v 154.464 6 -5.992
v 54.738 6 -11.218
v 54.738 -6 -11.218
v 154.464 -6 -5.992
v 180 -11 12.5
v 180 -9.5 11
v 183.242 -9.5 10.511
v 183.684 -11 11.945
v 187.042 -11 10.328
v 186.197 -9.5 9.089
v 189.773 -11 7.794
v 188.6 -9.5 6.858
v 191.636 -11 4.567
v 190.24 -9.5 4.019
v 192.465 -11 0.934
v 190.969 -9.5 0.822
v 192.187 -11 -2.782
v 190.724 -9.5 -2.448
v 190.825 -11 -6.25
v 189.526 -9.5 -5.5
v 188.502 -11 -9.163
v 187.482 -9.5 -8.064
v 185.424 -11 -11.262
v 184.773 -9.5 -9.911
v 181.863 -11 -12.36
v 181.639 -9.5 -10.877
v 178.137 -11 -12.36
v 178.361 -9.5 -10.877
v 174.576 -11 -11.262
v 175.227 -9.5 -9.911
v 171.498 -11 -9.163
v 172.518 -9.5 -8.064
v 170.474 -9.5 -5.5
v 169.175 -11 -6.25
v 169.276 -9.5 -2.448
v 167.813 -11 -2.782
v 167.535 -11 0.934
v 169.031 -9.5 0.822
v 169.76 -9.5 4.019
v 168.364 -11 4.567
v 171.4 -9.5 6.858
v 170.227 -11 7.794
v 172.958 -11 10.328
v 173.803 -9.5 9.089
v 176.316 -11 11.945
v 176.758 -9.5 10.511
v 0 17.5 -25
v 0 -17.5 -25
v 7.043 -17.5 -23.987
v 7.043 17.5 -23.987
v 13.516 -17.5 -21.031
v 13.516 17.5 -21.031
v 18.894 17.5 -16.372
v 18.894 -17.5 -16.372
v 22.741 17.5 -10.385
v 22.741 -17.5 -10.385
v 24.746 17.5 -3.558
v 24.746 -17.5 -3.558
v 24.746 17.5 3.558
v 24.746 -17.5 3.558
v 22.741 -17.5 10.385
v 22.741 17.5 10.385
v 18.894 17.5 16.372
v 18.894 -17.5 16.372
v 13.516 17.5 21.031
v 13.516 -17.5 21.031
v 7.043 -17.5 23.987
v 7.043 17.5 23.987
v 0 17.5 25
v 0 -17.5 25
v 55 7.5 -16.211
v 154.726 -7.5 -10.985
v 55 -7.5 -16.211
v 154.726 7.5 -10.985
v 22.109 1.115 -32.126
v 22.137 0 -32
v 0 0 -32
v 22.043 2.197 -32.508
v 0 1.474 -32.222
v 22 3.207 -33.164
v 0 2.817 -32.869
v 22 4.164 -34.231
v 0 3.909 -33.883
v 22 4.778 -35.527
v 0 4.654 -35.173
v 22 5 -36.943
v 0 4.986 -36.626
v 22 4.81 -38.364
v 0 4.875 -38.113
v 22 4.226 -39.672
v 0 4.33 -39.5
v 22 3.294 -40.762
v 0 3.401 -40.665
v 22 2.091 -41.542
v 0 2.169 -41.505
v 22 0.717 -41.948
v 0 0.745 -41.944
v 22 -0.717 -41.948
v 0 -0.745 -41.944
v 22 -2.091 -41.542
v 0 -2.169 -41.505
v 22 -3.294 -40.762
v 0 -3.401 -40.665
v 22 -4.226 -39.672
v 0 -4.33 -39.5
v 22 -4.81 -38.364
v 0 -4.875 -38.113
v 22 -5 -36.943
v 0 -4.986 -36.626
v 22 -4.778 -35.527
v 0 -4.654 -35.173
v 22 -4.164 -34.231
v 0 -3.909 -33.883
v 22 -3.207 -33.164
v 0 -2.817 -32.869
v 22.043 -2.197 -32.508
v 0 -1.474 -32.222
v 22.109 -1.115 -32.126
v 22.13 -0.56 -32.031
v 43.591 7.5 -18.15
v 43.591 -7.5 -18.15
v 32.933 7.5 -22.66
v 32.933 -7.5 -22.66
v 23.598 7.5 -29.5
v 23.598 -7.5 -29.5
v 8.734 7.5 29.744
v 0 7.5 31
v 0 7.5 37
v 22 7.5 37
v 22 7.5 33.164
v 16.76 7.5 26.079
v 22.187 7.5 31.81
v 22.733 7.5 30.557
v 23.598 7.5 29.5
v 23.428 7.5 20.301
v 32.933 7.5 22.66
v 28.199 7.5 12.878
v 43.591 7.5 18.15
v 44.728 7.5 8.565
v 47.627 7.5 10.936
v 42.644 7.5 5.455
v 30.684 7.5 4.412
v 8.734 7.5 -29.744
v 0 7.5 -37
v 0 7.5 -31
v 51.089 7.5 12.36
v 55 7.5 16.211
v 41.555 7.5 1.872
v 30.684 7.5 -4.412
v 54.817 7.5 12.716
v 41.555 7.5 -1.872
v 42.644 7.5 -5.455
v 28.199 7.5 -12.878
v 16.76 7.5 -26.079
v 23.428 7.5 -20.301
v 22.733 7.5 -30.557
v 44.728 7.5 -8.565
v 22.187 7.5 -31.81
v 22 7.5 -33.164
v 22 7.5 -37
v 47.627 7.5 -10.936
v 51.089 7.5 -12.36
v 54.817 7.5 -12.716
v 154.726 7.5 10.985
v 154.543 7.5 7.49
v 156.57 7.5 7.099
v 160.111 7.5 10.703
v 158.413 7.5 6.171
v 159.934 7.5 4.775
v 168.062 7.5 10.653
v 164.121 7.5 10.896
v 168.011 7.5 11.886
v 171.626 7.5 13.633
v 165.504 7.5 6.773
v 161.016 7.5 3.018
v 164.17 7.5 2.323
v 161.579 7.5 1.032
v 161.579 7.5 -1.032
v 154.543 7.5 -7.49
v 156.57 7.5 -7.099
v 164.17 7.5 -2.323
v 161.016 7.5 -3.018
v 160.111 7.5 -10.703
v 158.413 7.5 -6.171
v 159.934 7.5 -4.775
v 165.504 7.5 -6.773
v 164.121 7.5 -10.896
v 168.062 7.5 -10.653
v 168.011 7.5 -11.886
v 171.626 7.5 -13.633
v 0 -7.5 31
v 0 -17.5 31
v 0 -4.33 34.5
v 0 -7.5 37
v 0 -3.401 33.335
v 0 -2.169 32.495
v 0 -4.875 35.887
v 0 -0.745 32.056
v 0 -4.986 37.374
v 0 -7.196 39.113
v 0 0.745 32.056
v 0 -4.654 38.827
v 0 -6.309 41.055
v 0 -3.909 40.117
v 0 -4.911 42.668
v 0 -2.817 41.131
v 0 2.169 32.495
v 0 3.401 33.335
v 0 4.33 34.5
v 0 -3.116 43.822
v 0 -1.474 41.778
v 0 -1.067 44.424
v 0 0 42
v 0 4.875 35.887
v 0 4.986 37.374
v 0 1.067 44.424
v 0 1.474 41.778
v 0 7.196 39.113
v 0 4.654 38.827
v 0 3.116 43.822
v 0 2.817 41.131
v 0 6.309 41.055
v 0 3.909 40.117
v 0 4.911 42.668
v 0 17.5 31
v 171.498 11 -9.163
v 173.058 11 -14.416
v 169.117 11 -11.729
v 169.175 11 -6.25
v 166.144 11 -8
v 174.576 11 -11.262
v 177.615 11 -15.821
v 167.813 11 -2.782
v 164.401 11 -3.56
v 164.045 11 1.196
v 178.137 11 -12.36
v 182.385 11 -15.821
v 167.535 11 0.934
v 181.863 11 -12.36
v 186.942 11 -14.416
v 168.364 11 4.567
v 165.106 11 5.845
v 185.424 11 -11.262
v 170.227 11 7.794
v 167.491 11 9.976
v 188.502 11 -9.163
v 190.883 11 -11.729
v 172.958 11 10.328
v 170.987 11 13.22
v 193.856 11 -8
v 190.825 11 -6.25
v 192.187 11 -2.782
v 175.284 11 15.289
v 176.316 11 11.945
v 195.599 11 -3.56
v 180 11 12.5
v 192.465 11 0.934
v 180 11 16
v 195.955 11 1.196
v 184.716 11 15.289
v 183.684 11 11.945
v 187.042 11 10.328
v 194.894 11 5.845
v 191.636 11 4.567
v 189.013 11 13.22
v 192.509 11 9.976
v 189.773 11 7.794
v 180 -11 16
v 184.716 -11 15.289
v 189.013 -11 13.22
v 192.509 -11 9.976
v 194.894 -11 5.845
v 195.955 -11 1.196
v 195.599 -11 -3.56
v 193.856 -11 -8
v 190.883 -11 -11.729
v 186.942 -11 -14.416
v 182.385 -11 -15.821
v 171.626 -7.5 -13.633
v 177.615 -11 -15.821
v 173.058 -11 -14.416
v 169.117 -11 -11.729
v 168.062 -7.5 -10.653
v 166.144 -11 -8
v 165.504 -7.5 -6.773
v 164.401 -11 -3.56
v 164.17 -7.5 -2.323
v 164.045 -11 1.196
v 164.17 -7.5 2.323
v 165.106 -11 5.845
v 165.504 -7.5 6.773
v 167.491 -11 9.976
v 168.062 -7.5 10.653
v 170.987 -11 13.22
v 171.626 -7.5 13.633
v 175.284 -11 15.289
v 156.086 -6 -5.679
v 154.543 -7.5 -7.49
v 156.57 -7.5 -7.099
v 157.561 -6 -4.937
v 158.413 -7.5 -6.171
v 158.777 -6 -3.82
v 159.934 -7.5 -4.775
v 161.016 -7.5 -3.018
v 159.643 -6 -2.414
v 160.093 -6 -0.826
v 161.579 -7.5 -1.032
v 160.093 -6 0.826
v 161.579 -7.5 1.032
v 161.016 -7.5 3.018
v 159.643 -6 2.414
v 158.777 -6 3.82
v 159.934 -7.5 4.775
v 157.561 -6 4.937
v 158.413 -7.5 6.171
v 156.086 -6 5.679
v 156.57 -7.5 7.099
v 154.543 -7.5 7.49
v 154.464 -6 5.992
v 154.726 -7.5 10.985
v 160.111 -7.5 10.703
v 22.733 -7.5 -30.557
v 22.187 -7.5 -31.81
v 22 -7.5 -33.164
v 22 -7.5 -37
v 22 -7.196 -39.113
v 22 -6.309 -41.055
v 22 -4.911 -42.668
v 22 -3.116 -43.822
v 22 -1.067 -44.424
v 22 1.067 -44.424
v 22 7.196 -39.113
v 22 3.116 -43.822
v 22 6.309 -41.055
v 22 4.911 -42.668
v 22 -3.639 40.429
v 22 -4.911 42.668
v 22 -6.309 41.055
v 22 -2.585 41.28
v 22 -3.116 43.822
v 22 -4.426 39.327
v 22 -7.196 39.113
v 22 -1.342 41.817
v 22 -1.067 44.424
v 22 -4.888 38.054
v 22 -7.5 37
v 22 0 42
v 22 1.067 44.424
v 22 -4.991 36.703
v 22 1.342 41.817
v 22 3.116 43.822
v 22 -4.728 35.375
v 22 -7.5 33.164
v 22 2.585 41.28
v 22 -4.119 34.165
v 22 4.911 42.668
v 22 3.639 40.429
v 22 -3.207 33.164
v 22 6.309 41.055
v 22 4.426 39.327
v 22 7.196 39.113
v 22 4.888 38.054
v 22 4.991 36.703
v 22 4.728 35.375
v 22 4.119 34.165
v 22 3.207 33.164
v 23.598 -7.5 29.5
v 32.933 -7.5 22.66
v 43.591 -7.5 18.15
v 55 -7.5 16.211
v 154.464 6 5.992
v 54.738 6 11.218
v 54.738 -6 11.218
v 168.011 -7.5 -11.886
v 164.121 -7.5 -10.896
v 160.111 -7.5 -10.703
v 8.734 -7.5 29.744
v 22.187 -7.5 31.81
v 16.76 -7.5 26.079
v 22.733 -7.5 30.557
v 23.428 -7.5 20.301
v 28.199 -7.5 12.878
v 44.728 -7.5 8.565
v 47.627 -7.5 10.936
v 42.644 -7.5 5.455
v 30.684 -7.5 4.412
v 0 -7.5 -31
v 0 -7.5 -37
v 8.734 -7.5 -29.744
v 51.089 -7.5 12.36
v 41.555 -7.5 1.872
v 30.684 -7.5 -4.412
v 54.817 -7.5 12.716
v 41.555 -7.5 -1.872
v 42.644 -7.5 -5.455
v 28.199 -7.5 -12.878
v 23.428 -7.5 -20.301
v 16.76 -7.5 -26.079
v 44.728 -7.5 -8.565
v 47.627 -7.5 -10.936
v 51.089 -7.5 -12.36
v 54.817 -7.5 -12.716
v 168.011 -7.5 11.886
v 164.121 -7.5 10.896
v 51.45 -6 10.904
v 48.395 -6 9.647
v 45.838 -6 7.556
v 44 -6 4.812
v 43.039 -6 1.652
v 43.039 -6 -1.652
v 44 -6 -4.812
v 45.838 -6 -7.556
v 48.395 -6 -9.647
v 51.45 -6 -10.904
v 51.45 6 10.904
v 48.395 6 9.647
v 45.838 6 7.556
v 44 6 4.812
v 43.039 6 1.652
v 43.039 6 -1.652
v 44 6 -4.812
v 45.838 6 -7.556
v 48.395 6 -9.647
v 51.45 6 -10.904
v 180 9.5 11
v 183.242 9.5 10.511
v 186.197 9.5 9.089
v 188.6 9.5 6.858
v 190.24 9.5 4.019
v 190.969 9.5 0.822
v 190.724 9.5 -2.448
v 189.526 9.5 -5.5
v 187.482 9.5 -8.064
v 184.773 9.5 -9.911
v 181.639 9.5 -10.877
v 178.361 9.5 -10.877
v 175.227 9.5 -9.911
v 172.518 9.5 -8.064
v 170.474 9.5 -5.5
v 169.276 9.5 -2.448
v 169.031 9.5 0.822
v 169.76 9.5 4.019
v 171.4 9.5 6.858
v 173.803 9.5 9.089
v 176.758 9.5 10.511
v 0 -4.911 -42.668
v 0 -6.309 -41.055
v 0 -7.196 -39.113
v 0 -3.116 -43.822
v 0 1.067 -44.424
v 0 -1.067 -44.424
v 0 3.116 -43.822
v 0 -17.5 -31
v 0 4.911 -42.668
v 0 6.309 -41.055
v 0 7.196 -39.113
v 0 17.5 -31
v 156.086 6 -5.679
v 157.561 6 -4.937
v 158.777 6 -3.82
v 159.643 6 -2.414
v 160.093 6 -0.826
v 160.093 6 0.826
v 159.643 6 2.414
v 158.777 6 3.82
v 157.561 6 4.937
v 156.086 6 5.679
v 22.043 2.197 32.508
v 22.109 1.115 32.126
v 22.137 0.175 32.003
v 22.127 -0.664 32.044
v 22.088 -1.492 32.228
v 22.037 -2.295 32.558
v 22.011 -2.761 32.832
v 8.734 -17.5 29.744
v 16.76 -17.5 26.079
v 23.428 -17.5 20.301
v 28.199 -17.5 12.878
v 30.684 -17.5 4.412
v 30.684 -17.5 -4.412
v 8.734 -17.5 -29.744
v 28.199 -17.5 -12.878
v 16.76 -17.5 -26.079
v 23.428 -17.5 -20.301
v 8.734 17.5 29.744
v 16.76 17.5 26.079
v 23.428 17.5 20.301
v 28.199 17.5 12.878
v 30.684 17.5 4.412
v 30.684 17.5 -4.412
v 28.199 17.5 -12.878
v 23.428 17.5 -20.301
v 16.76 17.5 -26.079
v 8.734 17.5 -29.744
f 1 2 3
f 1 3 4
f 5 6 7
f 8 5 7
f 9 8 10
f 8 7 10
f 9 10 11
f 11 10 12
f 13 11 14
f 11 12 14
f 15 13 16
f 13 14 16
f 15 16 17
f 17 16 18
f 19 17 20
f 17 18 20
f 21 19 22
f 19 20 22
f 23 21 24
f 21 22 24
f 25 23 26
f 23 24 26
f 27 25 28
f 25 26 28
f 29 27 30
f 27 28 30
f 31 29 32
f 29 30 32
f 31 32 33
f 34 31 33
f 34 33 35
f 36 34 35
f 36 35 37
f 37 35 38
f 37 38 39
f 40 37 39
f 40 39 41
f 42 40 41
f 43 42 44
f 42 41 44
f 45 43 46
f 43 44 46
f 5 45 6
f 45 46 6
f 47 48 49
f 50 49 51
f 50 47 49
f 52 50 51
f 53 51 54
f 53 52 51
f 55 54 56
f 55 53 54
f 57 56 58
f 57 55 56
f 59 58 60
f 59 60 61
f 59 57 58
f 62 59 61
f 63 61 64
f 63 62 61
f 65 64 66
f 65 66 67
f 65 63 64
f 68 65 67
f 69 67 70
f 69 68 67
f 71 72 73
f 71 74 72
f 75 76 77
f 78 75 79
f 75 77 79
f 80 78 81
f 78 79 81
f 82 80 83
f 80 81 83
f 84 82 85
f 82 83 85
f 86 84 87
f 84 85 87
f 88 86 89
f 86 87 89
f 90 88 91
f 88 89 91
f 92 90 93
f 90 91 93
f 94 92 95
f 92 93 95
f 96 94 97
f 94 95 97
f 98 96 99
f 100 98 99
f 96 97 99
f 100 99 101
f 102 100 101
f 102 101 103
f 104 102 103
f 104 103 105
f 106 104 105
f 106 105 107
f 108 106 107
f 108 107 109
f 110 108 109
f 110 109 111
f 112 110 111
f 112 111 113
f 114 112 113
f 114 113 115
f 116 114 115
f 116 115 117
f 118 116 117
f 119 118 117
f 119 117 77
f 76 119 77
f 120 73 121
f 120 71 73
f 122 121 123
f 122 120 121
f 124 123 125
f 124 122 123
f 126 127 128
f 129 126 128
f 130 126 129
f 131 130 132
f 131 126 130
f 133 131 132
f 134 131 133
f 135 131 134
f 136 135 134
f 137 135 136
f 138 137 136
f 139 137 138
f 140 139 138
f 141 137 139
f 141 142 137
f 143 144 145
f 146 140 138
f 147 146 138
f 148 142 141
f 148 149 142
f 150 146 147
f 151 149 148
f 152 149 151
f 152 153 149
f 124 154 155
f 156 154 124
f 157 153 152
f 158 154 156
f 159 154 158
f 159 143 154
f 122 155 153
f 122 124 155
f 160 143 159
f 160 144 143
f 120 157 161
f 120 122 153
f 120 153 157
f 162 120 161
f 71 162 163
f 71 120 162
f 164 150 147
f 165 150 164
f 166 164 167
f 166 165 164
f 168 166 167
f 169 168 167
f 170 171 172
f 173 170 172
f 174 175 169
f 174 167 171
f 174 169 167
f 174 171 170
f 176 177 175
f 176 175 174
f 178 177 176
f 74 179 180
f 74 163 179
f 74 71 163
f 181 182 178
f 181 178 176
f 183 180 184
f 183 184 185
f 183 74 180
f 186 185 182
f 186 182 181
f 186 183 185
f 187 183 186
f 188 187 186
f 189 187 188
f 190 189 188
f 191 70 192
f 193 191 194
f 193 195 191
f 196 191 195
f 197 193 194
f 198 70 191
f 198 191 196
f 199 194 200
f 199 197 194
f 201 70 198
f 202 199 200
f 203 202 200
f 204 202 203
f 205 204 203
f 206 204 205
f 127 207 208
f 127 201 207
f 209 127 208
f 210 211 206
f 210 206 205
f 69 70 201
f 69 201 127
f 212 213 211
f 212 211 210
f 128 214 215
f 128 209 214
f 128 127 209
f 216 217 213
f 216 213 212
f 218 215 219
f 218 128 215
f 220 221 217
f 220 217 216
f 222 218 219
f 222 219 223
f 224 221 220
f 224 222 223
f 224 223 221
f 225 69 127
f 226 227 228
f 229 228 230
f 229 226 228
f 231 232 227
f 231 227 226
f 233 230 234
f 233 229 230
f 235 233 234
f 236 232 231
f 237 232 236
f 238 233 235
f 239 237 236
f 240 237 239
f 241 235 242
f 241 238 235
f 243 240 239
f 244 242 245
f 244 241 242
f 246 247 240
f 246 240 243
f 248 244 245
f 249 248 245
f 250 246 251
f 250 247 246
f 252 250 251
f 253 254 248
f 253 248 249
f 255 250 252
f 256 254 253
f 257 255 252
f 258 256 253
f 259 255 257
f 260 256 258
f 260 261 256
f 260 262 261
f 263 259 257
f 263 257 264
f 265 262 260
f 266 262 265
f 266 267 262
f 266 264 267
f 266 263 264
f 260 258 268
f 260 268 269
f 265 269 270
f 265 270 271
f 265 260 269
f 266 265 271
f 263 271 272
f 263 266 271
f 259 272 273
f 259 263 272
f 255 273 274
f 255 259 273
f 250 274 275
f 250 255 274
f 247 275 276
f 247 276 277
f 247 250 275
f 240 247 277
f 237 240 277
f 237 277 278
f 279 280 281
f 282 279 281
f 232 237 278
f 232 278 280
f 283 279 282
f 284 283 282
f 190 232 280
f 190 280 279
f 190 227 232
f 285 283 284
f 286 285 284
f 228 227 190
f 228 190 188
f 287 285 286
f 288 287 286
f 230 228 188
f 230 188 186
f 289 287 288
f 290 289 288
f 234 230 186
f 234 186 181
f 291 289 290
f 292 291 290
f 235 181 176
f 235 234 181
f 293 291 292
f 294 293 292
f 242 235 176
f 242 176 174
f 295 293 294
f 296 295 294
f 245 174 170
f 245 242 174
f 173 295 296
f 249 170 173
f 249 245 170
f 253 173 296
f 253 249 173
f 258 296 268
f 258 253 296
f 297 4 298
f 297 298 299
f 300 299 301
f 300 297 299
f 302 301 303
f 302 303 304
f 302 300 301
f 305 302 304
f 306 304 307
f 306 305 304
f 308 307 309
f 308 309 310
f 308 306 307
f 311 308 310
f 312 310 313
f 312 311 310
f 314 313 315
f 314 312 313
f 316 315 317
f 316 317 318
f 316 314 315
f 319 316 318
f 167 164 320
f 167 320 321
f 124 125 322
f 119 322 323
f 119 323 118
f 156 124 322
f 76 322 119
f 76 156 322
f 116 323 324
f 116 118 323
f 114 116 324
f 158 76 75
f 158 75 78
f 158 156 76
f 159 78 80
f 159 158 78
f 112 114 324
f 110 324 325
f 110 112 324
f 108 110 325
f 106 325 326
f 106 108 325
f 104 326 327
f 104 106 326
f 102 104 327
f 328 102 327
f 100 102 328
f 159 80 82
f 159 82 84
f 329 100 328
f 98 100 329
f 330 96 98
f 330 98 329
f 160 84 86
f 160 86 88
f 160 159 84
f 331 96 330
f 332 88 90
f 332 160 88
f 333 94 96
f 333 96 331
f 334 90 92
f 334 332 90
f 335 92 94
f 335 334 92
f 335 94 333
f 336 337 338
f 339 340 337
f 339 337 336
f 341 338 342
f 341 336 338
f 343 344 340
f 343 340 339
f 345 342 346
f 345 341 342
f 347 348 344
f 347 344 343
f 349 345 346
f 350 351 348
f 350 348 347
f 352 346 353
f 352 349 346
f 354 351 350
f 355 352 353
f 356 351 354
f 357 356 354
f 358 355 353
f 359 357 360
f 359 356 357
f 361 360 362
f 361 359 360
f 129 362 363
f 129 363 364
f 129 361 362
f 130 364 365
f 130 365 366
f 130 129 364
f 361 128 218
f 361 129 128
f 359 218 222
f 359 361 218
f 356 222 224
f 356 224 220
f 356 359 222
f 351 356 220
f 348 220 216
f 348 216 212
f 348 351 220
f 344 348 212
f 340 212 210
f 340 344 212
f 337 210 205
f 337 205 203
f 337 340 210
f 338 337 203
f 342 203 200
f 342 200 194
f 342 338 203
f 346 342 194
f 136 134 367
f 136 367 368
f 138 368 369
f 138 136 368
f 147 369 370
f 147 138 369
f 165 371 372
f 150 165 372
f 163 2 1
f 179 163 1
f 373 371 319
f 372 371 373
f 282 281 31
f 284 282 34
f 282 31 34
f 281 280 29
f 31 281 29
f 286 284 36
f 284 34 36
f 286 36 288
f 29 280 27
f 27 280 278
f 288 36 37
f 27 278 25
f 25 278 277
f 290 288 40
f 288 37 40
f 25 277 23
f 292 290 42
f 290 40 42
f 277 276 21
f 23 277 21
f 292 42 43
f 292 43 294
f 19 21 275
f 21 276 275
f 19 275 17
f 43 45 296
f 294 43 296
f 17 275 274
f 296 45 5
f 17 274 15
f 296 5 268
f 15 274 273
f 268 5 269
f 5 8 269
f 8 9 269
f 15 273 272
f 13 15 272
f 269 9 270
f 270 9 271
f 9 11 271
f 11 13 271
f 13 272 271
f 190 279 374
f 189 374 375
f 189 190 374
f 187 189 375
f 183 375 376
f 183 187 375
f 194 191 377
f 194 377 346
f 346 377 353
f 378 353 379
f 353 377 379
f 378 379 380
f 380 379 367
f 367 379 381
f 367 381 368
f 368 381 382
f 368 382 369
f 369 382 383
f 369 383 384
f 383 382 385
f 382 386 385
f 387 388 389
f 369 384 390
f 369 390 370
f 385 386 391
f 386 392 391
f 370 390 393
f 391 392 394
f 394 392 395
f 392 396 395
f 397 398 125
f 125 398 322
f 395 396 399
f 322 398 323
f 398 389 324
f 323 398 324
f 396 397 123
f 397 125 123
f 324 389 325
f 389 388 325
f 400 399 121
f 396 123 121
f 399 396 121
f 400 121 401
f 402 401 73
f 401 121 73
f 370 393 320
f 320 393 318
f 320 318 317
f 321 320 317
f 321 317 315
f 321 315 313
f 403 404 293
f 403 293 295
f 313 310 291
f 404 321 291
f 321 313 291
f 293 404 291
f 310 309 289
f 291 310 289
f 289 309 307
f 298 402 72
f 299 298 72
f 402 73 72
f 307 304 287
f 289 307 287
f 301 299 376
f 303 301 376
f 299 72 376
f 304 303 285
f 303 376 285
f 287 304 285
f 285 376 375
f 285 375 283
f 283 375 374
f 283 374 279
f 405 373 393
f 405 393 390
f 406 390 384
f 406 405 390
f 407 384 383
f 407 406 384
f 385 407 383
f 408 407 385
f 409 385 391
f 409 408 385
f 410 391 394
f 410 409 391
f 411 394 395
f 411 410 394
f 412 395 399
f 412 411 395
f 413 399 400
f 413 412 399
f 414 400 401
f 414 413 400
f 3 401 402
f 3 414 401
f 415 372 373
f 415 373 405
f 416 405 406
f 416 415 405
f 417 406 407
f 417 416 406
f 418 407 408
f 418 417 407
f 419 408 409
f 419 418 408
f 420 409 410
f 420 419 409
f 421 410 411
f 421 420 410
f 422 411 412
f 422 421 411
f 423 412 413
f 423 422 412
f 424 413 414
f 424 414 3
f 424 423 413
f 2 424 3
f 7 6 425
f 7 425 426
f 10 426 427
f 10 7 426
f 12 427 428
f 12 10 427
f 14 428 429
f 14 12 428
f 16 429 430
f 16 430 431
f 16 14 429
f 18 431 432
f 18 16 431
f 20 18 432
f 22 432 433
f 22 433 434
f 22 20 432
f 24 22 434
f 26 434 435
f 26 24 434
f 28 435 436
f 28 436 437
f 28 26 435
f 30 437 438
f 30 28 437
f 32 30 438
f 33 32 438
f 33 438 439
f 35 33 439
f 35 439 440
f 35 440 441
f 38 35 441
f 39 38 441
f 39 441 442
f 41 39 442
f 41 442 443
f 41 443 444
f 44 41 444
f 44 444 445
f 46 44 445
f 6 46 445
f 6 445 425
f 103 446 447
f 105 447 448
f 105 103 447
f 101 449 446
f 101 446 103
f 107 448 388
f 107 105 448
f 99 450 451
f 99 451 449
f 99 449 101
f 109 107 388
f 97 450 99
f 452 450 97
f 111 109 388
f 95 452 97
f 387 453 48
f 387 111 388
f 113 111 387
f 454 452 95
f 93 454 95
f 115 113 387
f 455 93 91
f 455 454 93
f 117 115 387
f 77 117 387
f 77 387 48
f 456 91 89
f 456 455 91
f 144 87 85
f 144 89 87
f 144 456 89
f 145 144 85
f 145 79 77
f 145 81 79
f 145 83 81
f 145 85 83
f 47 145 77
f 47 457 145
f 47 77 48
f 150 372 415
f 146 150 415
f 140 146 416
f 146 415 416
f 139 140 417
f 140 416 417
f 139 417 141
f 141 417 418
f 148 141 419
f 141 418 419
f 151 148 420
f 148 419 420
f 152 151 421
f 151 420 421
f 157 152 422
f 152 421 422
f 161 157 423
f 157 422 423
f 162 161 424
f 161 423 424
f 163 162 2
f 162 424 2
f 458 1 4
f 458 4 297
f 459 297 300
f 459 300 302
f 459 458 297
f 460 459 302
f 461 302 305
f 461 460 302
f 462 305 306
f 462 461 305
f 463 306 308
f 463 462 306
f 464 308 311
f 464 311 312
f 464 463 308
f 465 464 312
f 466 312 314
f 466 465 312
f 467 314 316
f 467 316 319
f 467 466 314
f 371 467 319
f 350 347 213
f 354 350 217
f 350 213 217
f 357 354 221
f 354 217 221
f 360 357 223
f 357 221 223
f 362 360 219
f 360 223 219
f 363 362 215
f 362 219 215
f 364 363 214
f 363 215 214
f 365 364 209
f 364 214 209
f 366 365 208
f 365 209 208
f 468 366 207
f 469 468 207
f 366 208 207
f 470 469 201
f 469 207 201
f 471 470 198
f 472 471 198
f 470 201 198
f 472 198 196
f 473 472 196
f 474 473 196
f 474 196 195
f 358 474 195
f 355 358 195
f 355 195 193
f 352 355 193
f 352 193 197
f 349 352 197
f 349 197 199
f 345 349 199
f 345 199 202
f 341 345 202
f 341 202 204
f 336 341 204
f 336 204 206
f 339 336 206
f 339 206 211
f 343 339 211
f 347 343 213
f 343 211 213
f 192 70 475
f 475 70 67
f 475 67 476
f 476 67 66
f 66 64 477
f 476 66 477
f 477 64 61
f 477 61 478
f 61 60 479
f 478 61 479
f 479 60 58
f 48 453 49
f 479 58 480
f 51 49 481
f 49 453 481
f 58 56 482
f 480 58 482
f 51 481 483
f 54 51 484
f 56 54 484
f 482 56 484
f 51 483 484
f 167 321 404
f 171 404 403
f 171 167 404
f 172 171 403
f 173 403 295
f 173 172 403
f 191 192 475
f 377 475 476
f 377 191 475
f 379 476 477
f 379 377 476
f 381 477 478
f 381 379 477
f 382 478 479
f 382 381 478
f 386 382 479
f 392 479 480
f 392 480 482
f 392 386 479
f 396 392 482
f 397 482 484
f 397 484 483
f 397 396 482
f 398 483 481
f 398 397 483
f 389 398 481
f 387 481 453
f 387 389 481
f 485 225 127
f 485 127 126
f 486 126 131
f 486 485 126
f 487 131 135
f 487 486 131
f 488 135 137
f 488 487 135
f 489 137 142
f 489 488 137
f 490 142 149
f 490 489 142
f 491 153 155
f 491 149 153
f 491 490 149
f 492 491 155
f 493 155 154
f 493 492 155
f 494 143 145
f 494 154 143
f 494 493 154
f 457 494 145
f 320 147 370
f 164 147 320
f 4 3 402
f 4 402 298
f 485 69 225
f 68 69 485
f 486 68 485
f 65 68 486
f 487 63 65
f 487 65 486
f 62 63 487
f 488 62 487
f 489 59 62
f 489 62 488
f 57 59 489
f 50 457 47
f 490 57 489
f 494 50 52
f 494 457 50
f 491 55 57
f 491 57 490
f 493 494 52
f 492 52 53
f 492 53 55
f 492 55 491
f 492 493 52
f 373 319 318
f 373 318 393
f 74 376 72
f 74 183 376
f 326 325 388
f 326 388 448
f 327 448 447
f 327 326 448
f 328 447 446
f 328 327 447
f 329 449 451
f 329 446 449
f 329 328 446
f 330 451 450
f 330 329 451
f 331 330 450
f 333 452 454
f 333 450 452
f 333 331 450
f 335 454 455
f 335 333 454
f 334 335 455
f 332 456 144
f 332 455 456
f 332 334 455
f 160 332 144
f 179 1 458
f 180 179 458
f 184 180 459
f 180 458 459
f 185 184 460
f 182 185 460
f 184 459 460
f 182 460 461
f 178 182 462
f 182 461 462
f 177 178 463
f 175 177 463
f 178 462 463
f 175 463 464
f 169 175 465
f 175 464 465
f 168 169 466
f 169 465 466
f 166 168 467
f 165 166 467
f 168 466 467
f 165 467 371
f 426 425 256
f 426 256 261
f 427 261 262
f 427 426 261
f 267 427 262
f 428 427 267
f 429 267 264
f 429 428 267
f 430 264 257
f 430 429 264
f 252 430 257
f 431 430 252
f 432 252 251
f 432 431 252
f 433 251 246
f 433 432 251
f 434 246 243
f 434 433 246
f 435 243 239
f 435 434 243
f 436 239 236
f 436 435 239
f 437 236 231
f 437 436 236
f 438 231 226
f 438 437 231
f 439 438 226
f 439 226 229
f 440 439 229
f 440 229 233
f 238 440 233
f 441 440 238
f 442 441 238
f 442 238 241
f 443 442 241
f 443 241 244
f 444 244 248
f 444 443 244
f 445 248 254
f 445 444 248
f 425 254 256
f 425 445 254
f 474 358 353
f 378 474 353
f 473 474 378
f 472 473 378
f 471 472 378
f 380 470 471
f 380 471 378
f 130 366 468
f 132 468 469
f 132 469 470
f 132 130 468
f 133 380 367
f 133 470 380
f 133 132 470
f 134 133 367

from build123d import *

# Parameters (mm, degrees)
SKETCH1_R           = 16
SKETCH1_R_2         = 11
BOSS_EXTRUDE1_DEPTH = 11
BOSS_EXTRUDE2_DEPTH = 17.5
BOSS_EXTRUDE3_DEPTH = 7.5
CHAMFER1_SIZE       = 1.5
FILLET1_RADIUS      = 7.5
FILLET1_LENGTH      = 22
FILLET2_RADIUS      = 7.5
FILLET2_LENGTH      = 22
SKETCH2_R           = 5
CUT_EXTRUDE1_DEPTH  = 202.748605943


with BuildPart() as part:
    # Sketch1 → Boss-Extrude1 (new, symmetric)
    with BuildSketch(Plane(origin=(0, 0, 0), x_dir=(1, 0, 0), z_dir=(0, 1, 0))):
        with Locations(Location((180, 0, 0), (0, 0, 270))):
            Circle(SKETCH1_R)
        with Locations(Location((180, 0, 0), (0, 0, 270))):
            Circle(SKETCH1_R_2, mode=Mode.SUBTRACT)
    extrude(amount=BOSS_EXTRUDE1_DEPTH, both=True)



with BuildPart() as body_2:
    # Sketch1<3> → Boss-Extrude2 (new, symmetric)
    with BuildSketch(Plane(origin=(0, 0, 0), x_dir=(1, 0, 0), z_dir=(0, 1, 0))):
        with BuildLine():
            Line((0, 31), (0, 25))
            ThreePointArc((0, 25), (25, 0), (0, -25))
            Line((0, -25), (0, -31))
            ThreePointArc((0, -31), (31, 0), (0, 31))
        make_face()
    extrude(amount=BOSS_EXTRUDE2_DEPTH, both=True)


with BuildPart() as part_1:
    add(part.part)

    add(body_2.part)  # Boss-Extrude3 merges body 2
    # Sketch1<4> → Boss-Extrude3 (add, symmetric)
    with BuildSketch(Plane(origin=(0, 0, 0), x_dir=(1, 0, 0), z_dir=(0, 1, 0))):
        with BuildLine():
            Line((0, 44.5), (0, 31))
            ThreePointArc((0, 31), (31, 0), (0, -31))
            Line((0, -31), (0, -44.5))
            Line((0, -44.5), (22, -44.5))
            Line((22, -44.5), (22, -33.163866466))
            ThreePointArc((22, -33.163866466), (22.416915225, -31.165033321), (23.598133576, -29.499537764))
            ThreePointArc((23.598133576, -29.499537764), (38.131334863, -20.095927671), (55, -16.211348046))
            Line((55, -16.211348046), (154.726094768, -10.984924882))
            Line((154.726094768, -10.984924882), (160.111143378, -10.702706443))
            ThreePointArc((160.111143378, -10.702706443), (166.09109505, -11.293263792), (171.625716668, -13.633465395))
            ThreePointArc((171.625716668, -13.633465395), (164, 0), (171.625716668, 13.633465395))
            ThreePointArc((171.625716668, 13.633465395), (166.09109505, 11.293263792), (160.111143378, 10.702706443))
            Line((160.111143378, 10.702706443), (154.726094768, 10.984924882))
            Line((154.726094768, 10.984924882), (55, 16.211348046))
            ThreePointArc((55, 16.211348046), (38.131334863, 20.095927671), (23.598133576, 29.499537764))
            ThreePointArc((23.598133576, 29.499537764), (22.416915225, 31.165033321), (22, 33.163866466))
            Line((22, 33.163866466), (22, 44.5))
            Line((22, 44.5), (0, 44.5))
        make_face()
        with BuildLine():
            Line((54.738320219, 11.218200372), (154.464414987, 5.991777209))
            ThreePointArc((154.464414987, 5.991777209), (160.15039925, 0), (154.464414987, -5.991777209))
            Line((154.464414987, -5.991777209), (54.738320219, -11.218200372))
            ThreePointArc((54.738320219, -11.218200372), (42.916803625, 0), (54.738320219, 11.218200372))
        make_face(mode=Mode.SUBTRACT)
    extrude(amount=BOSS_EXTRUDE3_DEPTH, both=True)

    # Chamfer1
    chamfer1_edges = [part_1.edges().sort_by_distance(p)[0] for p in [
        (160.15039925, 7.5, 0),
        (104.601367603, -7.5, 8.60498879),
        (42.916803625, 7.5, 0),
        (104.601367603, 7.5, -8.60498879),
        (104.601367603, 7.5, 8.60498879),
        (160.15039925, -7.5, 0),
        (104.601367603, -7.5, -8.60498879),
        (42.916803625, -7.5, 0),
        (180, -11, -11),
        (180, 11, -11),
    ]]
    chamfer(chamfer1_edges, length=CHAMFER1_SIZE)

    # Fillet1: full round fillet: the end face becomes a half cylinder, R = half its width
    fillet1_face = Plane((11, 0, 44.5), x_dir=(1, 0, 0), z_dir=(0, 0, 1))  # on the end face: x along it, z out of the body
    fillet1_slab = fillet1_face.offset(-FILLET1_RADIUS / 2) * Box(FILLET1_LENGTH, 2 * FILLET1_RADIUS, FILLET1_RADIUS, mode=Mode.PRIVATE)  # the body's end, R deep
    fillet1_round = Plane((11, 0, 37), x_dir=(0, 0, 1), z_dir=(1, 0, 0)) * Cylinder(FILLET1_RADIUS, FILLET1_LENGTH, mode=Mode.PRIVATE)  # its axis R under the face
    add(fillet1_slab - fillet1_round, mode=Mode.SUBTRACT)

    # Fillet2: full round fillet: the end face becomes a half cylinder, R = half its width
    fillet2_face = Plane((11, 0, -44.5), x_dir=(1, 0, 0), z_dir=(0, 0, -1))  # on the end face: x along it, z out of the body
    fillet2_slab = fillet2_face.offset(-FILLET2_RADIUS / 2) * Box(FILLET2_LENGTH, 2 * FILLET2_RADIUS, FILLET2_RADIUS, mode=Mode.PRIVATE)  # the body's end, R deep
    fillet2_round = Plane((11, 0, -37), x_dir=(0, 0, -1), z_dir=(1, 0, 0)) * Cylinder(FILLET2_RADIUS, FILLET2_LENGTH, mode=Mode.PRIVATE)  # its axis R under the face
    add(fillet2_slab - fillet2_round, mode=Mode.SUBTRACT)

    # Sketch2 → Cut-Extrude1 (cut, through all)
    with BuildSketch(Plane.ZY):
        with Locations((-37, 0)):
            Circle(SKETCH2_R)
        with Locations((37, 0)):
            Circle(SKETCH2_R)
    extrude(amount=-CUT_EXTRUDE1_DEPTH, mode=Mode.SUBTRACT)


solid = part_1.part
